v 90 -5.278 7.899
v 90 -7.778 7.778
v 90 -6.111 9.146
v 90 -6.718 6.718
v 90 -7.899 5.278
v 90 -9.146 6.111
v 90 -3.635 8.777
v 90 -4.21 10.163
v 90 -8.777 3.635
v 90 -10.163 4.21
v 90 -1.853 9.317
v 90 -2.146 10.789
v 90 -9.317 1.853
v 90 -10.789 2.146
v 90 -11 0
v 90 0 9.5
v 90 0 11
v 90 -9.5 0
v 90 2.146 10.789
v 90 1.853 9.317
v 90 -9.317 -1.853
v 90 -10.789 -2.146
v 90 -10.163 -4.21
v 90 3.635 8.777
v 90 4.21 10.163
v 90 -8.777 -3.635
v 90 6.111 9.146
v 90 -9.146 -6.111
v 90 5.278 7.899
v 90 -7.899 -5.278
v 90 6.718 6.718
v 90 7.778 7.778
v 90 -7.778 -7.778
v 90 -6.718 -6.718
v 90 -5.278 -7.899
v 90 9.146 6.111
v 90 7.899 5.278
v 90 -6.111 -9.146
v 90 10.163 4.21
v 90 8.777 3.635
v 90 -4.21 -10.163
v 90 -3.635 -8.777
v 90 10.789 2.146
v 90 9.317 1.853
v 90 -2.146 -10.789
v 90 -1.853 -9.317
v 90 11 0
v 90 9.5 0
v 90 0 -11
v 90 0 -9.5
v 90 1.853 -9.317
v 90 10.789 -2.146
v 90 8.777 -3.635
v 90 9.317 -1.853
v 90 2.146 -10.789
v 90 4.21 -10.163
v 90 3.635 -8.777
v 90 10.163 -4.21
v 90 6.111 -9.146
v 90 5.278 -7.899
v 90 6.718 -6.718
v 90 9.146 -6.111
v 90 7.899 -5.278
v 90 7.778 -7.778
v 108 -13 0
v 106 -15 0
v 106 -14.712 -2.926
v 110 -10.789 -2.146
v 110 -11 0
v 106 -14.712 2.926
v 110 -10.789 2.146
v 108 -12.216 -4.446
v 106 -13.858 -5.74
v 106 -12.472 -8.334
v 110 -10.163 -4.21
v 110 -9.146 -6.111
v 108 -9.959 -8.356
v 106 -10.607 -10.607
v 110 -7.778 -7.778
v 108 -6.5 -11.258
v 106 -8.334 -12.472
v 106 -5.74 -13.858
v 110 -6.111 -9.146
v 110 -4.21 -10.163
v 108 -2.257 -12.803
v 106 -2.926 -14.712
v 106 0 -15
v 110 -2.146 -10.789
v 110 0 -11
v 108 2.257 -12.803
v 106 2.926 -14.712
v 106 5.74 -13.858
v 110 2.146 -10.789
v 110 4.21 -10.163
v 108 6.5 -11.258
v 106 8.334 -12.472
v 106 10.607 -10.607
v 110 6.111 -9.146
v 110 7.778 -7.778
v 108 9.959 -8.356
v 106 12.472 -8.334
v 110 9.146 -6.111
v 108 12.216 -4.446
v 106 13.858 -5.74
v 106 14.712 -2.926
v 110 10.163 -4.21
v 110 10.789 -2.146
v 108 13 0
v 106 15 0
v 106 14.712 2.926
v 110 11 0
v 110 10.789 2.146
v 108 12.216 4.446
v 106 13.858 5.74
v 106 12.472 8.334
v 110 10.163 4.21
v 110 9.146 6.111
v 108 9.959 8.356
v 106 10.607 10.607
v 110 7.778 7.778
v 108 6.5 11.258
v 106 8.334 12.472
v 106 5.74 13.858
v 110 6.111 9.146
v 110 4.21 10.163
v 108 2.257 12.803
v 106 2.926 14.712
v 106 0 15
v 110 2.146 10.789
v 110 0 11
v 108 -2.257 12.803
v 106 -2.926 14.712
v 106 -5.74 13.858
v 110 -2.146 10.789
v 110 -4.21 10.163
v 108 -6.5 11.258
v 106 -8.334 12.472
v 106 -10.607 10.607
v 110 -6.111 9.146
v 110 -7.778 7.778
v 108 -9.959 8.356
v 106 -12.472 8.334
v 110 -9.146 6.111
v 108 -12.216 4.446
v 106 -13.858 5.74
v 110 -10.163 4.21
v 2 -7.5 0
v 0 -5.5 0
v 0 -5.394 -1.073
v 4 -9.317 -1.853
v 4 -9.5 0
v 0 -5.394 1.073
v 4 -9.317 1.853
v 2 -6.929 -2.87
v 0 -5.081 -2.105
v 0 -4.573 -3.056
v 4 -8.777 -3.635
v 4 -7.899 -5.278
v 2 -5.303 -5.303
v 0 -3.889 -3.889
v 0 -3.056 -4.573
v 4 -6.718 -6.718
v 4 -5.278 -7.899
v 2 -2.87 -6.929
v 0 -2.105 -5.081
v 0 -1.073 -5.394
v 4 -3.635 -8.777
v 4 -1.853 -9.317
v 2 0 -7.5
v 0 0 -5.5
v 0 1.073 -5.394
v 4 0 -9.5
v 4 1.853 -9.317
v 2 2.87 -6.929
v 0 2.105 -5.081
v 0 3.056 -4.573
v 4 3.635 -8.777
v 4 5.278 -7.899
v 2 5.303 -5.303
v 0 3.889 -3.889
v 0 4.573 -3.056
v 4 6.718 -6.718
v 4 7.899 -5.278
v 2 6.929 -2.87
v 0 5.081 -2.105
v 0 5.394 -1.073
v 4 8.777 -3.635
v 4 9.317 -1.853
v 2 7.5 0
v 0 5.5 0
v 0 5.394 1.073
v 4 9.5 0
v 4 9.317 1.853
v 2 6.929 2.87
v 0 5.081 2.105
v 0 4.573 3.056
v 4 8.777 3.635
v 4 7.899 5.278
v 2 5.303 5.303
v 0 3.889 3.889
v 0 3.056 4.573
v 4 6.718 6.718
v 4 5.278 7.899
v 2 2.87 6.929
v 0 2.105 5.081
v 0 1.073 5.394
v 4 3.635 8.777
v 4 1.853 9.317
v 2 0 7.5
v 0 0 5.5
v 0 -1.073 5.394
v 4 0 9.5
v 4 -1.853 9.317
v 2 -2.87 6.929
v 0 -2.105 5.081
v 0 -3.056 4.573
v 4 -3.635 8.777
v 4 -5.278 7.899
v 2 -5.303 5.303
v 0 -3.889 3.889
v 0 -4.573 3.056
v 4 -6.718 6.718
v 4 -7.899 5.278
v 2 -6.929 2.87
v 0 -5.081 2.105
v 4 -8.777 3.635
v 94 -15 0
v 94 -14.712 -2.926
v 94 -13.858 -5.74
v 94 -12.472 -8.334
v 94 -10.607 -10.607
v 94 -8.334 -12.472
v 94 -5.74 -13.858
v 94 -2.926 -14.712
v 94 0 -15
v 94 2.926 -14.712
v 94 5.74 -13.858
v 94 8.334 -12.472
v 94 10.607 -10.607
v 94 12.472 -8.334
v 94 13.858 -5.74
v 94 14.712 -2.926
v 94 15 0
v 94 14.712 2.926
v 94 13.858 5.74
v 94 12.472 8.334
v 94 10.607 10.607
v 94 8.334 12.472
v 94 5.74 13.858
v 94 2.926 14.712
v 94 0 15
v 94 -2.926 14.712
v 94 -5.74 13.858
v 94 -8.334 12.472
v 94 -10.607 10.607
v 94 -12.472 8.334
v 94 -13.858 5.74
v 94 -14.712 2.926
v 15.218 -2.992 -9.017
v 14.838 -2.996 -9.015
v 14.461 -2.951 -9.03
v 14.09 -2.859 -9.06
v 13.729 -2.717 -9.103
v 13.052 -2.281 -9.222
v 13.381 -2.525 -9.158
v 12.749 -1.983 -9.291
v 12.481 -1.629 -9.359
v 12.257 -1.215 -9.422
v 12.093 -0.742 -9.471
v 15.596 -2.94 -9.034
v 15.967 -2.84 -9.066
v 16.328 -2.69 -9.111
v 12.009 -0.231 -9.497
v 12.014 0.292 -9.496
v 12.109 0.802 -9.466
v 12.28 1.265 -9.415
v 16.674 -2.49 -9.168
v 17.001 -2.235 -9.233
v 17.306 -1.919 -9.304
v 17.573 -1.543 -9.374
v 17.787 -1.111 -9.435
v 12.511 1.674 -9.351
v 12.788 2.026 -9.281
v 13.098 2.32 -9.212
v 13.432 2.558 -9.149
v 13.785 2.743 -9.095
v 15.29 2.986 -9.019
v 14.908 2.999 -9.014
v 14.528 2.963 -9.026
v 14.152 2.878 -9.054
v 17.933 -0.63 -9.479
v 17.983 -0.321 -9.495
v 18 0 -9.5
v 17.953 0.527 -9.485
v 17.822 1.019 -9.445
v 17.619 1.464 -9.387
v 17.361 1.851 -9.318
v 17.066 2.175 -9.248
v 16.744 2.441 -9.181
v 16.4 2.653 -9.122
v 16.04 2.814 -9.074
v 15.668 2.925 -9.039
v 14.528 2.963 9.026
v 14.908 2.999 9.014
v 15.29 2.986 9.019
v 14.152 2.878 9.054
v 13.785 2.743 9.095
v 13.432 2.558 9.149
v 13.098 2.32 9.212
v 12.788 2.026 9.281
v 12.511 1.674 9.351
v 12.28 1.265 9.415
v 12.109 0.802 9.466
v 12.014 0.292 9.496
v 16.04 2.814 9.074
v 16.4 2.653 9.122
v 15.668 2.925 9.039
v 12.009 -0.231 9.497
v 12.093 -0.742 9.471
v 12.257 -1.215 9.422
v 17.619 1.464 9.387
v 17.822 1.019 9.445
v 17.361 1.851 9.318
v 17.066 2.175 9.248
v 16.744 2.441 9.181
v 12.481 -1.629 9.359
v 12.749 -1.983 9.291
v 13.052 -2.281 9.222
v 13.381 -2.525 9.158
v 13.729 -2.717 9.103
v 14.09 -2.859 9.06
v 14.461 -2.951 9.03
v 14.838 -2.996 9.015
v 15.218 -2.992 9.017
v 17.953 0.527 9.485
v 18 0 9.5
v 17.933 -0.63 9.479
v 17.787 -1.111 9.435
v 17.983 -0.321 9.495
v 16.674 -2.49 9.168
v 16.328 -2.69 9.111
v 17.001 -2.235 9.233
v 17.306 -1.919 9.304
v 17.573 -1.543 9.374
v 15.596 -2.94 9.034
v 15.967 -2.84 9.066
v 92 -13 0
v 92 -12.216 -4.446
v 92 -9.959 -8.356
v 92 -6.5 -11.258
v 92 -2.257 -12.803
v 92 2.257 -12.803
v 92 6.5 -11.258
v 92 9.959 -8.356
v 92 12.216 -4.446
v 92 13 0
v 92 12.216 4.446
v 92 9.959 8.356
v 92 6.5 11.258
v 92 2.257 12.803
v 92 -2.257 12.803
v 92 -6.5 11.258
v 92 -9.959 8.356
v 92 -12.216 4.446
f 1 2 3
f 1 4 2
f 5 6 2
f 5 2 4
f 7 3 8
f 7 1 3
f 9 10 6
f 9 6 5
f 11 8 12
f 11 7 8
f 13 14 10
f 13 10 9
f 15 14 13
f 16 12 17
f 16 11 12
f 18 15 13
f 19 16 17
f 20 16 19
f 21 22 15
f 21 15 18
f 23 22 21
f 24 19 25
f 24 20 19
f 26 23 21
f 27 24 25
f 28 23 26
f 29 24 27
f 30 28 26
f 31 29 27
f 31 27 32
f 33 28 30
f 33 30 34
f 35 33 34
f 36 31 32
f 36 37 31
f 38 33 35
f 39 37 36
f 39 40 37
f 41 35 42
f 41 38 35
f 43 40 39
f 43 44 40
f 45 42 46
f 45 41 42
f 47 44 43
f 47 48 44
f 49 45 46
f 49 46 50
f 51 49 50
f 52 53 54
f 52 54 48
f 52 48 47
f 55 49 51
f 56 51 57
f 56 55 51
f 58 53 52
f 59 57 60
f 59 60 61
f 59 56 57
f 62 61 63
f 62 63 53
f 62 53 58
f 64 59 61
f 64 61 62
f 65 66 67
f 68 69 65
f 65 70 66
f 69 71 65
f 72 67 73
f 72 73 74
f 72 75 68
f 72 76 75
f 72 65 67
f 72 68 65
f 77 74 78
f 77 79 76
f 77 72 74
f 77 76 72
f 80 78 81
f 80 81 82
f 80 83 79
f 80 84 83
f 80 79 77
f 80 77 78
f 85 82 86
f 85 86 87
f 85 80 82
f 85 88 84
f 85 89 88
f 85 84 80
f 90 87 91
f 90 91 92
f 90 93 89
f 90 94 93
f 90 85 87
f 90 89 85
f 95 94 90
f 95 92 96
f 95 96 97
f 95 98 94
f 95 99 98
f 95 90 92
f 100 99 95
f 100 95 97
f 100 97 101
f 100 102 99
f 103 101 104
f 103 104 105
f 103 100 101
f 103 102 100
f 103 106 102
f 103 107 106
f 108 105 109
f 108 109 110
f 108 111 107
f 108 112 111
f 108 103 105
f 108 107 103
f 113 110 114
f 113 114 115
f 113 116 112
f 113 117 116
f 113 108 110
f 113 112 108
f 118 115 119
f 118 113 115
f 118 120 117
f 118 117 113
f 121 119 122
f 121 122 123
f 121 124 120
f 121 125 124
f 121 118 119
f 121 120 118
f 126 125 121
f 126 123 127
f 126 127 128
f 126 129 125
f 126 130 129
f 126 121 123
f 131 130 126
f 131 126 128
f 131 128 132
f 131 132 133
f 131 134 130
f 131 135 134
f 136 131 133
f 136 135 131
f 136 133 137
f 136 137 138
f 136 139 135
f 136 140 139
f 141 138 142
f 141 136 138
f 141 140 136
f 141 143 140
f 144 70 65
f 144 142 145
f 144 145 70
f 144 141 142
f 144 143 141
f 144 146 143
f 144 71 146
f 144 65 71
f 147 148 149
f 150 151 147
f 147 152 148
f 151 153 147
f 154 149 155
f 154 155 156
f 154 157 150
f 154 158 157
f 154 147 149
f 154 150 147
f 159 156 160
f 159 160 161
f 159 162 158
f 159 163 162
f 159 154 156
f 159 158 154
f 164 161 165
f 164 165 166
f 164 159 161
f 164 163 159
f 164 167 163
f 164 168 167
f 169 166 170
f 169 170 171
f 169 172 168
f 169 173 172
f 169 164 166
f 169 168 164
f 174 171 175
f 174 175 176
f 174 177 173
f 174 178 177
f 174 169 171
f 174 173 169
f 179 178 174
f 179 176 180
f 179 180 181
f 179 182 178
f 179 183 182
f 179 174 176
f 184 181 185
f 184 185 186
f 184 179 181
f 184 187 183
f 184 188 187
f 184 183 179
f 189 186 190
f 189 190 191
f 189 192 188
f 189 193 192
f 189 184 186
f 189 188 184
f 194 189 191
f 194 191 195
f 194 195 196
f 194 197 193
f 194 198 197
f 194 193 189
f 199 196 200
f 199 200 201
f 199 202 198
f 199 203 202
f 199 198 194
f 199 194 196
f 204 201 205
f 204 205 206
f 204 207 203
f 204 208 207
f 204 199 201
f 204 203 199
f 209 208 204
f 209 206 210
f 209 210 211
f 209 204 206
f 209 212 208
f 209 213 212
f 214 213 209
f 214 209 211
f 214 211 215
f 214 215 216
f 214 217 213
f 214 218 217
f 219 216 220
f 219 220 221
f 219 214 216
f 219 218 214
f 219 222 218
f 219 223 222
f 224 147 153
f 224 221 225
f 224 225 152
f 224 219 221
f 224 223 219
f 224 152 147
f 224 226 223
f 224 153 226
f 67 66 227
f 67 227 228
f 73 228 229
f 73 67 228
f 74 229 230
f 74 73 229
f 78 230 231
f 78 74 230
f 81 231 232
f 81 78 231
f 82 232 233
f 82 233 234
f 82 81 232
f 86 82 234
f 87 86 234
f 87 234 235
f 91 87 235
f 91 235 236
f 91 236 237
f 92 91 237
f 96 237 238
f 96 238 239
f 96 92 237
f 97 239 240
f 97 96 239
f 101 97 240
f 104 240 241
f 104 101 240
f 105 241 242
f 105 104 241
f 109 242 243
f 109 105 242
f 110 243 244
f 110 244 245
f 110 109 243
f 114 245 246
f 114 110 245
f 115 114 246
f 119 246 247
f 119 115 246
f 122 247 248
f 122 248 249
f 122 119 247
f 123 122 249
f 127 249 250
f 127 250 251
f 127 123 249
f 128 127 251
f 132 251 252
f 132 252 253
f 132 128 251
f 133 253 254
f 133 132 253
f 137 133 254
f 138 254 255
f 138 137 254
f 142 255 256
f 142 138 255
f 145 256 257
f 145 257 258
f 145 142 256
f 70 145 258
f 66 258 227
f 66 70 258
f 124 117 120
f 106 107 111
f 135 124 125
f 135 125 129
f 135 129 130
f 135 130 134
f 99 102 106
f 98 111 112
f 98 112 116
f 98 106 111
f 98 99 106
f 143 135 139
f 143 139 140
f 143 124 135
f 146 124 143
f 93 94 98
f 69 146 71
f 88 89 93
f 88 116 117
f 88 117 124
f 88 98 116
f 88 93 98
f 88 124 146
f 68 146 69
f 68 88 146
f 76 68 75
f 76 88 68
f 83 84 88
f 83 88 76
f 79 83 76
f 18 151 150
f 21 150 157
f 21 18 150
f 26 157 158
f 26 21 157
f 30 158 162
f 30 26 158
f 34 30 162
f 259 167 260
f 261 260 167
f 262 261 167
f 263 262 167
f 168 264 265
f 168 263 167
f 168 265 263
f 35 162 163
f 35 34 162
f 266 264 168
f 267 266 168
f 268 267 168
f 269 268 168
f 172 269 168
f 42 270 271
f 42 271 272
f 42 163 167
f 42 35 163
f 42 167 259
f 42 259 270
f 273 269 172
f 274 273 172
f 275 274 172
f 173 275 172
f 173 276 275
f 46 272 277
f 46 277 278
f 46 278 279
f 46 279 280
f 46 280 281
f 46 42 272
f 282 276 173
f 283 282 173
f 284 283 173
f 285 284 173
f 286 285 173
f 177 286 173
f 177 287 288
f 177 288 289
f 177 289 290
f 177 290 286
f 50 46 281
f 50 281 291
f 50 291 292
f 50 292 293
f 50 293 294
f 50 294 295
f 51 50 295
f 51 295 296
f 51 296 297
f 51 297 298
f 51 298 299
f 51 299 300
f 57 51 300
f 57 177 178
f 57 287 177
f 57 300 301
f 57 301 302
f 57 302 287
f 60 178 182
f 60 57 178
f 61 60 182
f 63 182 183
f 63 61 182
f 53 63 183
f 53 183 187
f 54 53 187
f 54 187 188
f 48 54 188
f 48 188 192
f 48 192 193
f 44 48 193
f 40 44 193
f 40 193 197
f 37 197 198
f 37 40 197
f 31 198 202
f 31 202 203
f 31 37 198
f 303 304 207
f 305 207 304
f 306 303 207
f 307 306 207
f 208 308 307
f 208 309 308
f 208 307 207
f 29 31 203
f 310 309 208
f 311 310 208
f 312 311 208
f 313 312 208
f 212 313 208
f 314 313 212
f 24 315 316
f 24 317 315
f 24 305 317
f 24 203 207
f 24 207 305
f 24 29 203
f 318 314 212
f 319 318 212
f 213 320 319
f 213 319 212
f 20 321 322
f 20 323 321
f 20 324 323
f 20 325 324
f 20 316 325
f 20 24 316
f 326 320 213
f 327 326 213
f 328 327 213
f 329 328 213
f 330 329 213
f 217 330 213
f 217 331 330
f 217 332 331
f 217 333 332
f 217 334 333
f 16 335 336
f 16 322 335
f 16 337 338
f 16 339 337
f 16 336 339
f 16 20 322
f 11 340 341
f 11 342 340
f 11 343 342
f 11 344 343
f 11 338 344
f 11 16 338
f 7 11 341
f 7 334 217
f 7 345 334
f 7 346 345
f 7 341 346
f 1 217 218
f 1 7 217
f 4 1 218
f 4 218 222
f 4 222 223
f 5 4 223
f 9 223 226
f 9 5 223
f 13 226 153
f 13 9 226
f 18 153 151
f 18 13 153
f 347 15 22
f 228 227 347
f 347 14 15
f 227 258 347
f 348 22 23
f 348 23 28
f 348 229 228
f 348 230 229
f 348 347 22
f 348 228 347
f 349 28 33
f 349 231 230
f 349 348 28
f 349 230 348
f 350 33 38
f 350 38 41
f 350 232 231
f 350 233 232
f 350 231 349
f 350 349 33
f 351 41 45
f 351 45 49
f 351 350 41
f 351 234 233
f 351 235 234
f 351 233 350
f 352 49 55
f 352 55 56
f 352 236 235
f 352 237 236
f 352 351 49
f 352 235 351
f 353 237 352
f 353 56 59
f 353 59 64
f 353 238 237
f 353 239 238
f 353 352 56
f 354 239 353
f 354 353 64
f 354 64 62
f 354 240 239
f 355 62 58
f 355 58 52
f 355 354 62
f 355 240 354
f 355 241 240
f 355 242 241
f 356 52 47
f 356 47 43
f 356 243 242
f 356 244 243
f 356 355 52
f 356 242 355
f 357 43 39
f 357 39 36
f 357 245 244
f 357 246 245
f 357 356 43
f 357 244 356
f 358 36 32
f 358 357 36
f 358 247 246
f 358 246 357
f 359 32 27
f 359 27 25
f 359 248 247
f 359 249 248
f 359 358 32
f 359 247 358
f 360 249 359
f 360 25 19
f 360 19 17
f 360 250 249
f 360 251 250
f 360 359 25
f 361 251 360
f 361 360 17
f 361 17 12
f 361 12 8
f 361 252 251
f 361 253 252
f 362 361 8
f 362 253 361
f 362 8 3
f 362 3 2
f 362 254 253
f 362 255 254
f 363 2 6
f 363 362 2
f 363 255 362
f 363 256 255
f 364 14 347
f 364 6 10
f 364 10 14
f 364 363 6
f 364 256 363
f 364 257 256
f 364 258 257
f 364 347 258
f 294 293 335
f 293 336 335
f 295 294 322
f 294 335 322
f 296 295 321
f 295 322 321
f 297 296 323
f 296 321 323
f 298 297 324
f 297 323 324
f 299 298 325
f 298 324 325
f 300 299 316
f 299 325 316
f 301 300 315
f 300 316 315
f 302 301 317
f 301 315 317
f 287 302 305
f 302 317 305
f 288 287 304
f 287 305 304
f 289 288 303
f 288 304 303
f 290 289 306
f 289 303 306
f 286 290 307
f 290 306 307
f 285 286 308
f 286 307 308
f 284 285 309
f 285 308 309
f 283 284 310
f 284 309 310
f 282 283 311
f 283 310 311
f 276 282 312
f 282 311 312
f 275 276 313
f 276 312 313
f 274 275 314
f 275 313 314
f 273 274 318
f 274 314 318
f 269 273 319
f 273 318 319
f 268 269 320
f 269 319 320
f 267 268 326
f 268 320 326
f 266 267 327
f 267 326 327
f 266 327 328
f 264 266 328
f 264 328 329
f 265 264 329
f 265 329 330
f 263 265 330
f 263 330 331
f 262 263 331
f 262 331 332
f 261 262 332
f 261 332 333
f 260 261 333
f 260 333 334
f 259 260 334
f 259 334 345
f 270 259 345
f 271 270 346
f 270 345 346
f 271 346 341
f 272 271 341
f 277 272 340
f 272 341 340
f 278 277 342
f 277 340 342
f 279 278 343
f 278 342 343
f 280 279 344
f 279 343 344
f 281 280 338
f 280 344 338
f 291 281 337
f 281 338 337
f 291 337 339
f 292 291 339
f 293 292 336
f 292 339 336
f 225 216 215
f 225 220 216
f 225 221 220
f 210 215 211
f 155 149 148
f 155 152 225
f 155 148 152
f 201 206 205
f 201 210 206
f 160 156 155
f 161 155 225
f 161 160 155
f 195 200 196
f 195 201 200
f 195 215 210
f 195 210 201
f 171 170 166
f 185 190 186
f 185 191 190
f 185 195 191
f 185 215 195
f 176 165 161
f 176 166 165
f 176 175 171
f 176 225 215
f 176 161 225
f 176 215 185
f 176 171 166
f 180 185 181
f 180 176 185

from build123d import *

# Parameters (mm, degrees)
CHAMFER1_SIZE           = 4
SKETCH2_R               = 3
CUT_EXTRUDE1_DEPTH      = 16
CUT_EXTRUDE1_DEPTH_BACK = 16


with BuildPart() as part:
    # Sketch1 → Revolve1 (revolve)
    with BuildSketch(Plane.XY):
        Polygon((0, 0), (0, -9.5), (90, -9.5), (90, -15), (110, -15), (110, 0), align=None)
    revolve(axis=Axis((0, 0, 0), (1, 0, 0)))

    # Chamfer1
    chamfer1_edges = [part.edges().sort_by_distance(p)[0] for p in [
        (0, 9.5, 0),
        (90, 15, 0),
        (110, 15, 0),
    ]]
    chamfer(chamfer1_edges, length=CHAMFER1_SIZE)

    # Sketch2 → Cut-Extrude1 (cut, two sides)
    with BuildSketch(Plane.XY) as cut_extrude1_sk:
        with Locations((15, 0)):
            Circle(SKETCH2_R)
    extrude(amount=CUT_EXTRUDE1_DEPTH, mode=Mode.SUBTRACT)
    extrude(cut_extrude1_sk.sketch, amount=-CUT_EXTRUDE1_DEPTH_BACK, mode=Mode.SUBTRACT)


solid = part.part
